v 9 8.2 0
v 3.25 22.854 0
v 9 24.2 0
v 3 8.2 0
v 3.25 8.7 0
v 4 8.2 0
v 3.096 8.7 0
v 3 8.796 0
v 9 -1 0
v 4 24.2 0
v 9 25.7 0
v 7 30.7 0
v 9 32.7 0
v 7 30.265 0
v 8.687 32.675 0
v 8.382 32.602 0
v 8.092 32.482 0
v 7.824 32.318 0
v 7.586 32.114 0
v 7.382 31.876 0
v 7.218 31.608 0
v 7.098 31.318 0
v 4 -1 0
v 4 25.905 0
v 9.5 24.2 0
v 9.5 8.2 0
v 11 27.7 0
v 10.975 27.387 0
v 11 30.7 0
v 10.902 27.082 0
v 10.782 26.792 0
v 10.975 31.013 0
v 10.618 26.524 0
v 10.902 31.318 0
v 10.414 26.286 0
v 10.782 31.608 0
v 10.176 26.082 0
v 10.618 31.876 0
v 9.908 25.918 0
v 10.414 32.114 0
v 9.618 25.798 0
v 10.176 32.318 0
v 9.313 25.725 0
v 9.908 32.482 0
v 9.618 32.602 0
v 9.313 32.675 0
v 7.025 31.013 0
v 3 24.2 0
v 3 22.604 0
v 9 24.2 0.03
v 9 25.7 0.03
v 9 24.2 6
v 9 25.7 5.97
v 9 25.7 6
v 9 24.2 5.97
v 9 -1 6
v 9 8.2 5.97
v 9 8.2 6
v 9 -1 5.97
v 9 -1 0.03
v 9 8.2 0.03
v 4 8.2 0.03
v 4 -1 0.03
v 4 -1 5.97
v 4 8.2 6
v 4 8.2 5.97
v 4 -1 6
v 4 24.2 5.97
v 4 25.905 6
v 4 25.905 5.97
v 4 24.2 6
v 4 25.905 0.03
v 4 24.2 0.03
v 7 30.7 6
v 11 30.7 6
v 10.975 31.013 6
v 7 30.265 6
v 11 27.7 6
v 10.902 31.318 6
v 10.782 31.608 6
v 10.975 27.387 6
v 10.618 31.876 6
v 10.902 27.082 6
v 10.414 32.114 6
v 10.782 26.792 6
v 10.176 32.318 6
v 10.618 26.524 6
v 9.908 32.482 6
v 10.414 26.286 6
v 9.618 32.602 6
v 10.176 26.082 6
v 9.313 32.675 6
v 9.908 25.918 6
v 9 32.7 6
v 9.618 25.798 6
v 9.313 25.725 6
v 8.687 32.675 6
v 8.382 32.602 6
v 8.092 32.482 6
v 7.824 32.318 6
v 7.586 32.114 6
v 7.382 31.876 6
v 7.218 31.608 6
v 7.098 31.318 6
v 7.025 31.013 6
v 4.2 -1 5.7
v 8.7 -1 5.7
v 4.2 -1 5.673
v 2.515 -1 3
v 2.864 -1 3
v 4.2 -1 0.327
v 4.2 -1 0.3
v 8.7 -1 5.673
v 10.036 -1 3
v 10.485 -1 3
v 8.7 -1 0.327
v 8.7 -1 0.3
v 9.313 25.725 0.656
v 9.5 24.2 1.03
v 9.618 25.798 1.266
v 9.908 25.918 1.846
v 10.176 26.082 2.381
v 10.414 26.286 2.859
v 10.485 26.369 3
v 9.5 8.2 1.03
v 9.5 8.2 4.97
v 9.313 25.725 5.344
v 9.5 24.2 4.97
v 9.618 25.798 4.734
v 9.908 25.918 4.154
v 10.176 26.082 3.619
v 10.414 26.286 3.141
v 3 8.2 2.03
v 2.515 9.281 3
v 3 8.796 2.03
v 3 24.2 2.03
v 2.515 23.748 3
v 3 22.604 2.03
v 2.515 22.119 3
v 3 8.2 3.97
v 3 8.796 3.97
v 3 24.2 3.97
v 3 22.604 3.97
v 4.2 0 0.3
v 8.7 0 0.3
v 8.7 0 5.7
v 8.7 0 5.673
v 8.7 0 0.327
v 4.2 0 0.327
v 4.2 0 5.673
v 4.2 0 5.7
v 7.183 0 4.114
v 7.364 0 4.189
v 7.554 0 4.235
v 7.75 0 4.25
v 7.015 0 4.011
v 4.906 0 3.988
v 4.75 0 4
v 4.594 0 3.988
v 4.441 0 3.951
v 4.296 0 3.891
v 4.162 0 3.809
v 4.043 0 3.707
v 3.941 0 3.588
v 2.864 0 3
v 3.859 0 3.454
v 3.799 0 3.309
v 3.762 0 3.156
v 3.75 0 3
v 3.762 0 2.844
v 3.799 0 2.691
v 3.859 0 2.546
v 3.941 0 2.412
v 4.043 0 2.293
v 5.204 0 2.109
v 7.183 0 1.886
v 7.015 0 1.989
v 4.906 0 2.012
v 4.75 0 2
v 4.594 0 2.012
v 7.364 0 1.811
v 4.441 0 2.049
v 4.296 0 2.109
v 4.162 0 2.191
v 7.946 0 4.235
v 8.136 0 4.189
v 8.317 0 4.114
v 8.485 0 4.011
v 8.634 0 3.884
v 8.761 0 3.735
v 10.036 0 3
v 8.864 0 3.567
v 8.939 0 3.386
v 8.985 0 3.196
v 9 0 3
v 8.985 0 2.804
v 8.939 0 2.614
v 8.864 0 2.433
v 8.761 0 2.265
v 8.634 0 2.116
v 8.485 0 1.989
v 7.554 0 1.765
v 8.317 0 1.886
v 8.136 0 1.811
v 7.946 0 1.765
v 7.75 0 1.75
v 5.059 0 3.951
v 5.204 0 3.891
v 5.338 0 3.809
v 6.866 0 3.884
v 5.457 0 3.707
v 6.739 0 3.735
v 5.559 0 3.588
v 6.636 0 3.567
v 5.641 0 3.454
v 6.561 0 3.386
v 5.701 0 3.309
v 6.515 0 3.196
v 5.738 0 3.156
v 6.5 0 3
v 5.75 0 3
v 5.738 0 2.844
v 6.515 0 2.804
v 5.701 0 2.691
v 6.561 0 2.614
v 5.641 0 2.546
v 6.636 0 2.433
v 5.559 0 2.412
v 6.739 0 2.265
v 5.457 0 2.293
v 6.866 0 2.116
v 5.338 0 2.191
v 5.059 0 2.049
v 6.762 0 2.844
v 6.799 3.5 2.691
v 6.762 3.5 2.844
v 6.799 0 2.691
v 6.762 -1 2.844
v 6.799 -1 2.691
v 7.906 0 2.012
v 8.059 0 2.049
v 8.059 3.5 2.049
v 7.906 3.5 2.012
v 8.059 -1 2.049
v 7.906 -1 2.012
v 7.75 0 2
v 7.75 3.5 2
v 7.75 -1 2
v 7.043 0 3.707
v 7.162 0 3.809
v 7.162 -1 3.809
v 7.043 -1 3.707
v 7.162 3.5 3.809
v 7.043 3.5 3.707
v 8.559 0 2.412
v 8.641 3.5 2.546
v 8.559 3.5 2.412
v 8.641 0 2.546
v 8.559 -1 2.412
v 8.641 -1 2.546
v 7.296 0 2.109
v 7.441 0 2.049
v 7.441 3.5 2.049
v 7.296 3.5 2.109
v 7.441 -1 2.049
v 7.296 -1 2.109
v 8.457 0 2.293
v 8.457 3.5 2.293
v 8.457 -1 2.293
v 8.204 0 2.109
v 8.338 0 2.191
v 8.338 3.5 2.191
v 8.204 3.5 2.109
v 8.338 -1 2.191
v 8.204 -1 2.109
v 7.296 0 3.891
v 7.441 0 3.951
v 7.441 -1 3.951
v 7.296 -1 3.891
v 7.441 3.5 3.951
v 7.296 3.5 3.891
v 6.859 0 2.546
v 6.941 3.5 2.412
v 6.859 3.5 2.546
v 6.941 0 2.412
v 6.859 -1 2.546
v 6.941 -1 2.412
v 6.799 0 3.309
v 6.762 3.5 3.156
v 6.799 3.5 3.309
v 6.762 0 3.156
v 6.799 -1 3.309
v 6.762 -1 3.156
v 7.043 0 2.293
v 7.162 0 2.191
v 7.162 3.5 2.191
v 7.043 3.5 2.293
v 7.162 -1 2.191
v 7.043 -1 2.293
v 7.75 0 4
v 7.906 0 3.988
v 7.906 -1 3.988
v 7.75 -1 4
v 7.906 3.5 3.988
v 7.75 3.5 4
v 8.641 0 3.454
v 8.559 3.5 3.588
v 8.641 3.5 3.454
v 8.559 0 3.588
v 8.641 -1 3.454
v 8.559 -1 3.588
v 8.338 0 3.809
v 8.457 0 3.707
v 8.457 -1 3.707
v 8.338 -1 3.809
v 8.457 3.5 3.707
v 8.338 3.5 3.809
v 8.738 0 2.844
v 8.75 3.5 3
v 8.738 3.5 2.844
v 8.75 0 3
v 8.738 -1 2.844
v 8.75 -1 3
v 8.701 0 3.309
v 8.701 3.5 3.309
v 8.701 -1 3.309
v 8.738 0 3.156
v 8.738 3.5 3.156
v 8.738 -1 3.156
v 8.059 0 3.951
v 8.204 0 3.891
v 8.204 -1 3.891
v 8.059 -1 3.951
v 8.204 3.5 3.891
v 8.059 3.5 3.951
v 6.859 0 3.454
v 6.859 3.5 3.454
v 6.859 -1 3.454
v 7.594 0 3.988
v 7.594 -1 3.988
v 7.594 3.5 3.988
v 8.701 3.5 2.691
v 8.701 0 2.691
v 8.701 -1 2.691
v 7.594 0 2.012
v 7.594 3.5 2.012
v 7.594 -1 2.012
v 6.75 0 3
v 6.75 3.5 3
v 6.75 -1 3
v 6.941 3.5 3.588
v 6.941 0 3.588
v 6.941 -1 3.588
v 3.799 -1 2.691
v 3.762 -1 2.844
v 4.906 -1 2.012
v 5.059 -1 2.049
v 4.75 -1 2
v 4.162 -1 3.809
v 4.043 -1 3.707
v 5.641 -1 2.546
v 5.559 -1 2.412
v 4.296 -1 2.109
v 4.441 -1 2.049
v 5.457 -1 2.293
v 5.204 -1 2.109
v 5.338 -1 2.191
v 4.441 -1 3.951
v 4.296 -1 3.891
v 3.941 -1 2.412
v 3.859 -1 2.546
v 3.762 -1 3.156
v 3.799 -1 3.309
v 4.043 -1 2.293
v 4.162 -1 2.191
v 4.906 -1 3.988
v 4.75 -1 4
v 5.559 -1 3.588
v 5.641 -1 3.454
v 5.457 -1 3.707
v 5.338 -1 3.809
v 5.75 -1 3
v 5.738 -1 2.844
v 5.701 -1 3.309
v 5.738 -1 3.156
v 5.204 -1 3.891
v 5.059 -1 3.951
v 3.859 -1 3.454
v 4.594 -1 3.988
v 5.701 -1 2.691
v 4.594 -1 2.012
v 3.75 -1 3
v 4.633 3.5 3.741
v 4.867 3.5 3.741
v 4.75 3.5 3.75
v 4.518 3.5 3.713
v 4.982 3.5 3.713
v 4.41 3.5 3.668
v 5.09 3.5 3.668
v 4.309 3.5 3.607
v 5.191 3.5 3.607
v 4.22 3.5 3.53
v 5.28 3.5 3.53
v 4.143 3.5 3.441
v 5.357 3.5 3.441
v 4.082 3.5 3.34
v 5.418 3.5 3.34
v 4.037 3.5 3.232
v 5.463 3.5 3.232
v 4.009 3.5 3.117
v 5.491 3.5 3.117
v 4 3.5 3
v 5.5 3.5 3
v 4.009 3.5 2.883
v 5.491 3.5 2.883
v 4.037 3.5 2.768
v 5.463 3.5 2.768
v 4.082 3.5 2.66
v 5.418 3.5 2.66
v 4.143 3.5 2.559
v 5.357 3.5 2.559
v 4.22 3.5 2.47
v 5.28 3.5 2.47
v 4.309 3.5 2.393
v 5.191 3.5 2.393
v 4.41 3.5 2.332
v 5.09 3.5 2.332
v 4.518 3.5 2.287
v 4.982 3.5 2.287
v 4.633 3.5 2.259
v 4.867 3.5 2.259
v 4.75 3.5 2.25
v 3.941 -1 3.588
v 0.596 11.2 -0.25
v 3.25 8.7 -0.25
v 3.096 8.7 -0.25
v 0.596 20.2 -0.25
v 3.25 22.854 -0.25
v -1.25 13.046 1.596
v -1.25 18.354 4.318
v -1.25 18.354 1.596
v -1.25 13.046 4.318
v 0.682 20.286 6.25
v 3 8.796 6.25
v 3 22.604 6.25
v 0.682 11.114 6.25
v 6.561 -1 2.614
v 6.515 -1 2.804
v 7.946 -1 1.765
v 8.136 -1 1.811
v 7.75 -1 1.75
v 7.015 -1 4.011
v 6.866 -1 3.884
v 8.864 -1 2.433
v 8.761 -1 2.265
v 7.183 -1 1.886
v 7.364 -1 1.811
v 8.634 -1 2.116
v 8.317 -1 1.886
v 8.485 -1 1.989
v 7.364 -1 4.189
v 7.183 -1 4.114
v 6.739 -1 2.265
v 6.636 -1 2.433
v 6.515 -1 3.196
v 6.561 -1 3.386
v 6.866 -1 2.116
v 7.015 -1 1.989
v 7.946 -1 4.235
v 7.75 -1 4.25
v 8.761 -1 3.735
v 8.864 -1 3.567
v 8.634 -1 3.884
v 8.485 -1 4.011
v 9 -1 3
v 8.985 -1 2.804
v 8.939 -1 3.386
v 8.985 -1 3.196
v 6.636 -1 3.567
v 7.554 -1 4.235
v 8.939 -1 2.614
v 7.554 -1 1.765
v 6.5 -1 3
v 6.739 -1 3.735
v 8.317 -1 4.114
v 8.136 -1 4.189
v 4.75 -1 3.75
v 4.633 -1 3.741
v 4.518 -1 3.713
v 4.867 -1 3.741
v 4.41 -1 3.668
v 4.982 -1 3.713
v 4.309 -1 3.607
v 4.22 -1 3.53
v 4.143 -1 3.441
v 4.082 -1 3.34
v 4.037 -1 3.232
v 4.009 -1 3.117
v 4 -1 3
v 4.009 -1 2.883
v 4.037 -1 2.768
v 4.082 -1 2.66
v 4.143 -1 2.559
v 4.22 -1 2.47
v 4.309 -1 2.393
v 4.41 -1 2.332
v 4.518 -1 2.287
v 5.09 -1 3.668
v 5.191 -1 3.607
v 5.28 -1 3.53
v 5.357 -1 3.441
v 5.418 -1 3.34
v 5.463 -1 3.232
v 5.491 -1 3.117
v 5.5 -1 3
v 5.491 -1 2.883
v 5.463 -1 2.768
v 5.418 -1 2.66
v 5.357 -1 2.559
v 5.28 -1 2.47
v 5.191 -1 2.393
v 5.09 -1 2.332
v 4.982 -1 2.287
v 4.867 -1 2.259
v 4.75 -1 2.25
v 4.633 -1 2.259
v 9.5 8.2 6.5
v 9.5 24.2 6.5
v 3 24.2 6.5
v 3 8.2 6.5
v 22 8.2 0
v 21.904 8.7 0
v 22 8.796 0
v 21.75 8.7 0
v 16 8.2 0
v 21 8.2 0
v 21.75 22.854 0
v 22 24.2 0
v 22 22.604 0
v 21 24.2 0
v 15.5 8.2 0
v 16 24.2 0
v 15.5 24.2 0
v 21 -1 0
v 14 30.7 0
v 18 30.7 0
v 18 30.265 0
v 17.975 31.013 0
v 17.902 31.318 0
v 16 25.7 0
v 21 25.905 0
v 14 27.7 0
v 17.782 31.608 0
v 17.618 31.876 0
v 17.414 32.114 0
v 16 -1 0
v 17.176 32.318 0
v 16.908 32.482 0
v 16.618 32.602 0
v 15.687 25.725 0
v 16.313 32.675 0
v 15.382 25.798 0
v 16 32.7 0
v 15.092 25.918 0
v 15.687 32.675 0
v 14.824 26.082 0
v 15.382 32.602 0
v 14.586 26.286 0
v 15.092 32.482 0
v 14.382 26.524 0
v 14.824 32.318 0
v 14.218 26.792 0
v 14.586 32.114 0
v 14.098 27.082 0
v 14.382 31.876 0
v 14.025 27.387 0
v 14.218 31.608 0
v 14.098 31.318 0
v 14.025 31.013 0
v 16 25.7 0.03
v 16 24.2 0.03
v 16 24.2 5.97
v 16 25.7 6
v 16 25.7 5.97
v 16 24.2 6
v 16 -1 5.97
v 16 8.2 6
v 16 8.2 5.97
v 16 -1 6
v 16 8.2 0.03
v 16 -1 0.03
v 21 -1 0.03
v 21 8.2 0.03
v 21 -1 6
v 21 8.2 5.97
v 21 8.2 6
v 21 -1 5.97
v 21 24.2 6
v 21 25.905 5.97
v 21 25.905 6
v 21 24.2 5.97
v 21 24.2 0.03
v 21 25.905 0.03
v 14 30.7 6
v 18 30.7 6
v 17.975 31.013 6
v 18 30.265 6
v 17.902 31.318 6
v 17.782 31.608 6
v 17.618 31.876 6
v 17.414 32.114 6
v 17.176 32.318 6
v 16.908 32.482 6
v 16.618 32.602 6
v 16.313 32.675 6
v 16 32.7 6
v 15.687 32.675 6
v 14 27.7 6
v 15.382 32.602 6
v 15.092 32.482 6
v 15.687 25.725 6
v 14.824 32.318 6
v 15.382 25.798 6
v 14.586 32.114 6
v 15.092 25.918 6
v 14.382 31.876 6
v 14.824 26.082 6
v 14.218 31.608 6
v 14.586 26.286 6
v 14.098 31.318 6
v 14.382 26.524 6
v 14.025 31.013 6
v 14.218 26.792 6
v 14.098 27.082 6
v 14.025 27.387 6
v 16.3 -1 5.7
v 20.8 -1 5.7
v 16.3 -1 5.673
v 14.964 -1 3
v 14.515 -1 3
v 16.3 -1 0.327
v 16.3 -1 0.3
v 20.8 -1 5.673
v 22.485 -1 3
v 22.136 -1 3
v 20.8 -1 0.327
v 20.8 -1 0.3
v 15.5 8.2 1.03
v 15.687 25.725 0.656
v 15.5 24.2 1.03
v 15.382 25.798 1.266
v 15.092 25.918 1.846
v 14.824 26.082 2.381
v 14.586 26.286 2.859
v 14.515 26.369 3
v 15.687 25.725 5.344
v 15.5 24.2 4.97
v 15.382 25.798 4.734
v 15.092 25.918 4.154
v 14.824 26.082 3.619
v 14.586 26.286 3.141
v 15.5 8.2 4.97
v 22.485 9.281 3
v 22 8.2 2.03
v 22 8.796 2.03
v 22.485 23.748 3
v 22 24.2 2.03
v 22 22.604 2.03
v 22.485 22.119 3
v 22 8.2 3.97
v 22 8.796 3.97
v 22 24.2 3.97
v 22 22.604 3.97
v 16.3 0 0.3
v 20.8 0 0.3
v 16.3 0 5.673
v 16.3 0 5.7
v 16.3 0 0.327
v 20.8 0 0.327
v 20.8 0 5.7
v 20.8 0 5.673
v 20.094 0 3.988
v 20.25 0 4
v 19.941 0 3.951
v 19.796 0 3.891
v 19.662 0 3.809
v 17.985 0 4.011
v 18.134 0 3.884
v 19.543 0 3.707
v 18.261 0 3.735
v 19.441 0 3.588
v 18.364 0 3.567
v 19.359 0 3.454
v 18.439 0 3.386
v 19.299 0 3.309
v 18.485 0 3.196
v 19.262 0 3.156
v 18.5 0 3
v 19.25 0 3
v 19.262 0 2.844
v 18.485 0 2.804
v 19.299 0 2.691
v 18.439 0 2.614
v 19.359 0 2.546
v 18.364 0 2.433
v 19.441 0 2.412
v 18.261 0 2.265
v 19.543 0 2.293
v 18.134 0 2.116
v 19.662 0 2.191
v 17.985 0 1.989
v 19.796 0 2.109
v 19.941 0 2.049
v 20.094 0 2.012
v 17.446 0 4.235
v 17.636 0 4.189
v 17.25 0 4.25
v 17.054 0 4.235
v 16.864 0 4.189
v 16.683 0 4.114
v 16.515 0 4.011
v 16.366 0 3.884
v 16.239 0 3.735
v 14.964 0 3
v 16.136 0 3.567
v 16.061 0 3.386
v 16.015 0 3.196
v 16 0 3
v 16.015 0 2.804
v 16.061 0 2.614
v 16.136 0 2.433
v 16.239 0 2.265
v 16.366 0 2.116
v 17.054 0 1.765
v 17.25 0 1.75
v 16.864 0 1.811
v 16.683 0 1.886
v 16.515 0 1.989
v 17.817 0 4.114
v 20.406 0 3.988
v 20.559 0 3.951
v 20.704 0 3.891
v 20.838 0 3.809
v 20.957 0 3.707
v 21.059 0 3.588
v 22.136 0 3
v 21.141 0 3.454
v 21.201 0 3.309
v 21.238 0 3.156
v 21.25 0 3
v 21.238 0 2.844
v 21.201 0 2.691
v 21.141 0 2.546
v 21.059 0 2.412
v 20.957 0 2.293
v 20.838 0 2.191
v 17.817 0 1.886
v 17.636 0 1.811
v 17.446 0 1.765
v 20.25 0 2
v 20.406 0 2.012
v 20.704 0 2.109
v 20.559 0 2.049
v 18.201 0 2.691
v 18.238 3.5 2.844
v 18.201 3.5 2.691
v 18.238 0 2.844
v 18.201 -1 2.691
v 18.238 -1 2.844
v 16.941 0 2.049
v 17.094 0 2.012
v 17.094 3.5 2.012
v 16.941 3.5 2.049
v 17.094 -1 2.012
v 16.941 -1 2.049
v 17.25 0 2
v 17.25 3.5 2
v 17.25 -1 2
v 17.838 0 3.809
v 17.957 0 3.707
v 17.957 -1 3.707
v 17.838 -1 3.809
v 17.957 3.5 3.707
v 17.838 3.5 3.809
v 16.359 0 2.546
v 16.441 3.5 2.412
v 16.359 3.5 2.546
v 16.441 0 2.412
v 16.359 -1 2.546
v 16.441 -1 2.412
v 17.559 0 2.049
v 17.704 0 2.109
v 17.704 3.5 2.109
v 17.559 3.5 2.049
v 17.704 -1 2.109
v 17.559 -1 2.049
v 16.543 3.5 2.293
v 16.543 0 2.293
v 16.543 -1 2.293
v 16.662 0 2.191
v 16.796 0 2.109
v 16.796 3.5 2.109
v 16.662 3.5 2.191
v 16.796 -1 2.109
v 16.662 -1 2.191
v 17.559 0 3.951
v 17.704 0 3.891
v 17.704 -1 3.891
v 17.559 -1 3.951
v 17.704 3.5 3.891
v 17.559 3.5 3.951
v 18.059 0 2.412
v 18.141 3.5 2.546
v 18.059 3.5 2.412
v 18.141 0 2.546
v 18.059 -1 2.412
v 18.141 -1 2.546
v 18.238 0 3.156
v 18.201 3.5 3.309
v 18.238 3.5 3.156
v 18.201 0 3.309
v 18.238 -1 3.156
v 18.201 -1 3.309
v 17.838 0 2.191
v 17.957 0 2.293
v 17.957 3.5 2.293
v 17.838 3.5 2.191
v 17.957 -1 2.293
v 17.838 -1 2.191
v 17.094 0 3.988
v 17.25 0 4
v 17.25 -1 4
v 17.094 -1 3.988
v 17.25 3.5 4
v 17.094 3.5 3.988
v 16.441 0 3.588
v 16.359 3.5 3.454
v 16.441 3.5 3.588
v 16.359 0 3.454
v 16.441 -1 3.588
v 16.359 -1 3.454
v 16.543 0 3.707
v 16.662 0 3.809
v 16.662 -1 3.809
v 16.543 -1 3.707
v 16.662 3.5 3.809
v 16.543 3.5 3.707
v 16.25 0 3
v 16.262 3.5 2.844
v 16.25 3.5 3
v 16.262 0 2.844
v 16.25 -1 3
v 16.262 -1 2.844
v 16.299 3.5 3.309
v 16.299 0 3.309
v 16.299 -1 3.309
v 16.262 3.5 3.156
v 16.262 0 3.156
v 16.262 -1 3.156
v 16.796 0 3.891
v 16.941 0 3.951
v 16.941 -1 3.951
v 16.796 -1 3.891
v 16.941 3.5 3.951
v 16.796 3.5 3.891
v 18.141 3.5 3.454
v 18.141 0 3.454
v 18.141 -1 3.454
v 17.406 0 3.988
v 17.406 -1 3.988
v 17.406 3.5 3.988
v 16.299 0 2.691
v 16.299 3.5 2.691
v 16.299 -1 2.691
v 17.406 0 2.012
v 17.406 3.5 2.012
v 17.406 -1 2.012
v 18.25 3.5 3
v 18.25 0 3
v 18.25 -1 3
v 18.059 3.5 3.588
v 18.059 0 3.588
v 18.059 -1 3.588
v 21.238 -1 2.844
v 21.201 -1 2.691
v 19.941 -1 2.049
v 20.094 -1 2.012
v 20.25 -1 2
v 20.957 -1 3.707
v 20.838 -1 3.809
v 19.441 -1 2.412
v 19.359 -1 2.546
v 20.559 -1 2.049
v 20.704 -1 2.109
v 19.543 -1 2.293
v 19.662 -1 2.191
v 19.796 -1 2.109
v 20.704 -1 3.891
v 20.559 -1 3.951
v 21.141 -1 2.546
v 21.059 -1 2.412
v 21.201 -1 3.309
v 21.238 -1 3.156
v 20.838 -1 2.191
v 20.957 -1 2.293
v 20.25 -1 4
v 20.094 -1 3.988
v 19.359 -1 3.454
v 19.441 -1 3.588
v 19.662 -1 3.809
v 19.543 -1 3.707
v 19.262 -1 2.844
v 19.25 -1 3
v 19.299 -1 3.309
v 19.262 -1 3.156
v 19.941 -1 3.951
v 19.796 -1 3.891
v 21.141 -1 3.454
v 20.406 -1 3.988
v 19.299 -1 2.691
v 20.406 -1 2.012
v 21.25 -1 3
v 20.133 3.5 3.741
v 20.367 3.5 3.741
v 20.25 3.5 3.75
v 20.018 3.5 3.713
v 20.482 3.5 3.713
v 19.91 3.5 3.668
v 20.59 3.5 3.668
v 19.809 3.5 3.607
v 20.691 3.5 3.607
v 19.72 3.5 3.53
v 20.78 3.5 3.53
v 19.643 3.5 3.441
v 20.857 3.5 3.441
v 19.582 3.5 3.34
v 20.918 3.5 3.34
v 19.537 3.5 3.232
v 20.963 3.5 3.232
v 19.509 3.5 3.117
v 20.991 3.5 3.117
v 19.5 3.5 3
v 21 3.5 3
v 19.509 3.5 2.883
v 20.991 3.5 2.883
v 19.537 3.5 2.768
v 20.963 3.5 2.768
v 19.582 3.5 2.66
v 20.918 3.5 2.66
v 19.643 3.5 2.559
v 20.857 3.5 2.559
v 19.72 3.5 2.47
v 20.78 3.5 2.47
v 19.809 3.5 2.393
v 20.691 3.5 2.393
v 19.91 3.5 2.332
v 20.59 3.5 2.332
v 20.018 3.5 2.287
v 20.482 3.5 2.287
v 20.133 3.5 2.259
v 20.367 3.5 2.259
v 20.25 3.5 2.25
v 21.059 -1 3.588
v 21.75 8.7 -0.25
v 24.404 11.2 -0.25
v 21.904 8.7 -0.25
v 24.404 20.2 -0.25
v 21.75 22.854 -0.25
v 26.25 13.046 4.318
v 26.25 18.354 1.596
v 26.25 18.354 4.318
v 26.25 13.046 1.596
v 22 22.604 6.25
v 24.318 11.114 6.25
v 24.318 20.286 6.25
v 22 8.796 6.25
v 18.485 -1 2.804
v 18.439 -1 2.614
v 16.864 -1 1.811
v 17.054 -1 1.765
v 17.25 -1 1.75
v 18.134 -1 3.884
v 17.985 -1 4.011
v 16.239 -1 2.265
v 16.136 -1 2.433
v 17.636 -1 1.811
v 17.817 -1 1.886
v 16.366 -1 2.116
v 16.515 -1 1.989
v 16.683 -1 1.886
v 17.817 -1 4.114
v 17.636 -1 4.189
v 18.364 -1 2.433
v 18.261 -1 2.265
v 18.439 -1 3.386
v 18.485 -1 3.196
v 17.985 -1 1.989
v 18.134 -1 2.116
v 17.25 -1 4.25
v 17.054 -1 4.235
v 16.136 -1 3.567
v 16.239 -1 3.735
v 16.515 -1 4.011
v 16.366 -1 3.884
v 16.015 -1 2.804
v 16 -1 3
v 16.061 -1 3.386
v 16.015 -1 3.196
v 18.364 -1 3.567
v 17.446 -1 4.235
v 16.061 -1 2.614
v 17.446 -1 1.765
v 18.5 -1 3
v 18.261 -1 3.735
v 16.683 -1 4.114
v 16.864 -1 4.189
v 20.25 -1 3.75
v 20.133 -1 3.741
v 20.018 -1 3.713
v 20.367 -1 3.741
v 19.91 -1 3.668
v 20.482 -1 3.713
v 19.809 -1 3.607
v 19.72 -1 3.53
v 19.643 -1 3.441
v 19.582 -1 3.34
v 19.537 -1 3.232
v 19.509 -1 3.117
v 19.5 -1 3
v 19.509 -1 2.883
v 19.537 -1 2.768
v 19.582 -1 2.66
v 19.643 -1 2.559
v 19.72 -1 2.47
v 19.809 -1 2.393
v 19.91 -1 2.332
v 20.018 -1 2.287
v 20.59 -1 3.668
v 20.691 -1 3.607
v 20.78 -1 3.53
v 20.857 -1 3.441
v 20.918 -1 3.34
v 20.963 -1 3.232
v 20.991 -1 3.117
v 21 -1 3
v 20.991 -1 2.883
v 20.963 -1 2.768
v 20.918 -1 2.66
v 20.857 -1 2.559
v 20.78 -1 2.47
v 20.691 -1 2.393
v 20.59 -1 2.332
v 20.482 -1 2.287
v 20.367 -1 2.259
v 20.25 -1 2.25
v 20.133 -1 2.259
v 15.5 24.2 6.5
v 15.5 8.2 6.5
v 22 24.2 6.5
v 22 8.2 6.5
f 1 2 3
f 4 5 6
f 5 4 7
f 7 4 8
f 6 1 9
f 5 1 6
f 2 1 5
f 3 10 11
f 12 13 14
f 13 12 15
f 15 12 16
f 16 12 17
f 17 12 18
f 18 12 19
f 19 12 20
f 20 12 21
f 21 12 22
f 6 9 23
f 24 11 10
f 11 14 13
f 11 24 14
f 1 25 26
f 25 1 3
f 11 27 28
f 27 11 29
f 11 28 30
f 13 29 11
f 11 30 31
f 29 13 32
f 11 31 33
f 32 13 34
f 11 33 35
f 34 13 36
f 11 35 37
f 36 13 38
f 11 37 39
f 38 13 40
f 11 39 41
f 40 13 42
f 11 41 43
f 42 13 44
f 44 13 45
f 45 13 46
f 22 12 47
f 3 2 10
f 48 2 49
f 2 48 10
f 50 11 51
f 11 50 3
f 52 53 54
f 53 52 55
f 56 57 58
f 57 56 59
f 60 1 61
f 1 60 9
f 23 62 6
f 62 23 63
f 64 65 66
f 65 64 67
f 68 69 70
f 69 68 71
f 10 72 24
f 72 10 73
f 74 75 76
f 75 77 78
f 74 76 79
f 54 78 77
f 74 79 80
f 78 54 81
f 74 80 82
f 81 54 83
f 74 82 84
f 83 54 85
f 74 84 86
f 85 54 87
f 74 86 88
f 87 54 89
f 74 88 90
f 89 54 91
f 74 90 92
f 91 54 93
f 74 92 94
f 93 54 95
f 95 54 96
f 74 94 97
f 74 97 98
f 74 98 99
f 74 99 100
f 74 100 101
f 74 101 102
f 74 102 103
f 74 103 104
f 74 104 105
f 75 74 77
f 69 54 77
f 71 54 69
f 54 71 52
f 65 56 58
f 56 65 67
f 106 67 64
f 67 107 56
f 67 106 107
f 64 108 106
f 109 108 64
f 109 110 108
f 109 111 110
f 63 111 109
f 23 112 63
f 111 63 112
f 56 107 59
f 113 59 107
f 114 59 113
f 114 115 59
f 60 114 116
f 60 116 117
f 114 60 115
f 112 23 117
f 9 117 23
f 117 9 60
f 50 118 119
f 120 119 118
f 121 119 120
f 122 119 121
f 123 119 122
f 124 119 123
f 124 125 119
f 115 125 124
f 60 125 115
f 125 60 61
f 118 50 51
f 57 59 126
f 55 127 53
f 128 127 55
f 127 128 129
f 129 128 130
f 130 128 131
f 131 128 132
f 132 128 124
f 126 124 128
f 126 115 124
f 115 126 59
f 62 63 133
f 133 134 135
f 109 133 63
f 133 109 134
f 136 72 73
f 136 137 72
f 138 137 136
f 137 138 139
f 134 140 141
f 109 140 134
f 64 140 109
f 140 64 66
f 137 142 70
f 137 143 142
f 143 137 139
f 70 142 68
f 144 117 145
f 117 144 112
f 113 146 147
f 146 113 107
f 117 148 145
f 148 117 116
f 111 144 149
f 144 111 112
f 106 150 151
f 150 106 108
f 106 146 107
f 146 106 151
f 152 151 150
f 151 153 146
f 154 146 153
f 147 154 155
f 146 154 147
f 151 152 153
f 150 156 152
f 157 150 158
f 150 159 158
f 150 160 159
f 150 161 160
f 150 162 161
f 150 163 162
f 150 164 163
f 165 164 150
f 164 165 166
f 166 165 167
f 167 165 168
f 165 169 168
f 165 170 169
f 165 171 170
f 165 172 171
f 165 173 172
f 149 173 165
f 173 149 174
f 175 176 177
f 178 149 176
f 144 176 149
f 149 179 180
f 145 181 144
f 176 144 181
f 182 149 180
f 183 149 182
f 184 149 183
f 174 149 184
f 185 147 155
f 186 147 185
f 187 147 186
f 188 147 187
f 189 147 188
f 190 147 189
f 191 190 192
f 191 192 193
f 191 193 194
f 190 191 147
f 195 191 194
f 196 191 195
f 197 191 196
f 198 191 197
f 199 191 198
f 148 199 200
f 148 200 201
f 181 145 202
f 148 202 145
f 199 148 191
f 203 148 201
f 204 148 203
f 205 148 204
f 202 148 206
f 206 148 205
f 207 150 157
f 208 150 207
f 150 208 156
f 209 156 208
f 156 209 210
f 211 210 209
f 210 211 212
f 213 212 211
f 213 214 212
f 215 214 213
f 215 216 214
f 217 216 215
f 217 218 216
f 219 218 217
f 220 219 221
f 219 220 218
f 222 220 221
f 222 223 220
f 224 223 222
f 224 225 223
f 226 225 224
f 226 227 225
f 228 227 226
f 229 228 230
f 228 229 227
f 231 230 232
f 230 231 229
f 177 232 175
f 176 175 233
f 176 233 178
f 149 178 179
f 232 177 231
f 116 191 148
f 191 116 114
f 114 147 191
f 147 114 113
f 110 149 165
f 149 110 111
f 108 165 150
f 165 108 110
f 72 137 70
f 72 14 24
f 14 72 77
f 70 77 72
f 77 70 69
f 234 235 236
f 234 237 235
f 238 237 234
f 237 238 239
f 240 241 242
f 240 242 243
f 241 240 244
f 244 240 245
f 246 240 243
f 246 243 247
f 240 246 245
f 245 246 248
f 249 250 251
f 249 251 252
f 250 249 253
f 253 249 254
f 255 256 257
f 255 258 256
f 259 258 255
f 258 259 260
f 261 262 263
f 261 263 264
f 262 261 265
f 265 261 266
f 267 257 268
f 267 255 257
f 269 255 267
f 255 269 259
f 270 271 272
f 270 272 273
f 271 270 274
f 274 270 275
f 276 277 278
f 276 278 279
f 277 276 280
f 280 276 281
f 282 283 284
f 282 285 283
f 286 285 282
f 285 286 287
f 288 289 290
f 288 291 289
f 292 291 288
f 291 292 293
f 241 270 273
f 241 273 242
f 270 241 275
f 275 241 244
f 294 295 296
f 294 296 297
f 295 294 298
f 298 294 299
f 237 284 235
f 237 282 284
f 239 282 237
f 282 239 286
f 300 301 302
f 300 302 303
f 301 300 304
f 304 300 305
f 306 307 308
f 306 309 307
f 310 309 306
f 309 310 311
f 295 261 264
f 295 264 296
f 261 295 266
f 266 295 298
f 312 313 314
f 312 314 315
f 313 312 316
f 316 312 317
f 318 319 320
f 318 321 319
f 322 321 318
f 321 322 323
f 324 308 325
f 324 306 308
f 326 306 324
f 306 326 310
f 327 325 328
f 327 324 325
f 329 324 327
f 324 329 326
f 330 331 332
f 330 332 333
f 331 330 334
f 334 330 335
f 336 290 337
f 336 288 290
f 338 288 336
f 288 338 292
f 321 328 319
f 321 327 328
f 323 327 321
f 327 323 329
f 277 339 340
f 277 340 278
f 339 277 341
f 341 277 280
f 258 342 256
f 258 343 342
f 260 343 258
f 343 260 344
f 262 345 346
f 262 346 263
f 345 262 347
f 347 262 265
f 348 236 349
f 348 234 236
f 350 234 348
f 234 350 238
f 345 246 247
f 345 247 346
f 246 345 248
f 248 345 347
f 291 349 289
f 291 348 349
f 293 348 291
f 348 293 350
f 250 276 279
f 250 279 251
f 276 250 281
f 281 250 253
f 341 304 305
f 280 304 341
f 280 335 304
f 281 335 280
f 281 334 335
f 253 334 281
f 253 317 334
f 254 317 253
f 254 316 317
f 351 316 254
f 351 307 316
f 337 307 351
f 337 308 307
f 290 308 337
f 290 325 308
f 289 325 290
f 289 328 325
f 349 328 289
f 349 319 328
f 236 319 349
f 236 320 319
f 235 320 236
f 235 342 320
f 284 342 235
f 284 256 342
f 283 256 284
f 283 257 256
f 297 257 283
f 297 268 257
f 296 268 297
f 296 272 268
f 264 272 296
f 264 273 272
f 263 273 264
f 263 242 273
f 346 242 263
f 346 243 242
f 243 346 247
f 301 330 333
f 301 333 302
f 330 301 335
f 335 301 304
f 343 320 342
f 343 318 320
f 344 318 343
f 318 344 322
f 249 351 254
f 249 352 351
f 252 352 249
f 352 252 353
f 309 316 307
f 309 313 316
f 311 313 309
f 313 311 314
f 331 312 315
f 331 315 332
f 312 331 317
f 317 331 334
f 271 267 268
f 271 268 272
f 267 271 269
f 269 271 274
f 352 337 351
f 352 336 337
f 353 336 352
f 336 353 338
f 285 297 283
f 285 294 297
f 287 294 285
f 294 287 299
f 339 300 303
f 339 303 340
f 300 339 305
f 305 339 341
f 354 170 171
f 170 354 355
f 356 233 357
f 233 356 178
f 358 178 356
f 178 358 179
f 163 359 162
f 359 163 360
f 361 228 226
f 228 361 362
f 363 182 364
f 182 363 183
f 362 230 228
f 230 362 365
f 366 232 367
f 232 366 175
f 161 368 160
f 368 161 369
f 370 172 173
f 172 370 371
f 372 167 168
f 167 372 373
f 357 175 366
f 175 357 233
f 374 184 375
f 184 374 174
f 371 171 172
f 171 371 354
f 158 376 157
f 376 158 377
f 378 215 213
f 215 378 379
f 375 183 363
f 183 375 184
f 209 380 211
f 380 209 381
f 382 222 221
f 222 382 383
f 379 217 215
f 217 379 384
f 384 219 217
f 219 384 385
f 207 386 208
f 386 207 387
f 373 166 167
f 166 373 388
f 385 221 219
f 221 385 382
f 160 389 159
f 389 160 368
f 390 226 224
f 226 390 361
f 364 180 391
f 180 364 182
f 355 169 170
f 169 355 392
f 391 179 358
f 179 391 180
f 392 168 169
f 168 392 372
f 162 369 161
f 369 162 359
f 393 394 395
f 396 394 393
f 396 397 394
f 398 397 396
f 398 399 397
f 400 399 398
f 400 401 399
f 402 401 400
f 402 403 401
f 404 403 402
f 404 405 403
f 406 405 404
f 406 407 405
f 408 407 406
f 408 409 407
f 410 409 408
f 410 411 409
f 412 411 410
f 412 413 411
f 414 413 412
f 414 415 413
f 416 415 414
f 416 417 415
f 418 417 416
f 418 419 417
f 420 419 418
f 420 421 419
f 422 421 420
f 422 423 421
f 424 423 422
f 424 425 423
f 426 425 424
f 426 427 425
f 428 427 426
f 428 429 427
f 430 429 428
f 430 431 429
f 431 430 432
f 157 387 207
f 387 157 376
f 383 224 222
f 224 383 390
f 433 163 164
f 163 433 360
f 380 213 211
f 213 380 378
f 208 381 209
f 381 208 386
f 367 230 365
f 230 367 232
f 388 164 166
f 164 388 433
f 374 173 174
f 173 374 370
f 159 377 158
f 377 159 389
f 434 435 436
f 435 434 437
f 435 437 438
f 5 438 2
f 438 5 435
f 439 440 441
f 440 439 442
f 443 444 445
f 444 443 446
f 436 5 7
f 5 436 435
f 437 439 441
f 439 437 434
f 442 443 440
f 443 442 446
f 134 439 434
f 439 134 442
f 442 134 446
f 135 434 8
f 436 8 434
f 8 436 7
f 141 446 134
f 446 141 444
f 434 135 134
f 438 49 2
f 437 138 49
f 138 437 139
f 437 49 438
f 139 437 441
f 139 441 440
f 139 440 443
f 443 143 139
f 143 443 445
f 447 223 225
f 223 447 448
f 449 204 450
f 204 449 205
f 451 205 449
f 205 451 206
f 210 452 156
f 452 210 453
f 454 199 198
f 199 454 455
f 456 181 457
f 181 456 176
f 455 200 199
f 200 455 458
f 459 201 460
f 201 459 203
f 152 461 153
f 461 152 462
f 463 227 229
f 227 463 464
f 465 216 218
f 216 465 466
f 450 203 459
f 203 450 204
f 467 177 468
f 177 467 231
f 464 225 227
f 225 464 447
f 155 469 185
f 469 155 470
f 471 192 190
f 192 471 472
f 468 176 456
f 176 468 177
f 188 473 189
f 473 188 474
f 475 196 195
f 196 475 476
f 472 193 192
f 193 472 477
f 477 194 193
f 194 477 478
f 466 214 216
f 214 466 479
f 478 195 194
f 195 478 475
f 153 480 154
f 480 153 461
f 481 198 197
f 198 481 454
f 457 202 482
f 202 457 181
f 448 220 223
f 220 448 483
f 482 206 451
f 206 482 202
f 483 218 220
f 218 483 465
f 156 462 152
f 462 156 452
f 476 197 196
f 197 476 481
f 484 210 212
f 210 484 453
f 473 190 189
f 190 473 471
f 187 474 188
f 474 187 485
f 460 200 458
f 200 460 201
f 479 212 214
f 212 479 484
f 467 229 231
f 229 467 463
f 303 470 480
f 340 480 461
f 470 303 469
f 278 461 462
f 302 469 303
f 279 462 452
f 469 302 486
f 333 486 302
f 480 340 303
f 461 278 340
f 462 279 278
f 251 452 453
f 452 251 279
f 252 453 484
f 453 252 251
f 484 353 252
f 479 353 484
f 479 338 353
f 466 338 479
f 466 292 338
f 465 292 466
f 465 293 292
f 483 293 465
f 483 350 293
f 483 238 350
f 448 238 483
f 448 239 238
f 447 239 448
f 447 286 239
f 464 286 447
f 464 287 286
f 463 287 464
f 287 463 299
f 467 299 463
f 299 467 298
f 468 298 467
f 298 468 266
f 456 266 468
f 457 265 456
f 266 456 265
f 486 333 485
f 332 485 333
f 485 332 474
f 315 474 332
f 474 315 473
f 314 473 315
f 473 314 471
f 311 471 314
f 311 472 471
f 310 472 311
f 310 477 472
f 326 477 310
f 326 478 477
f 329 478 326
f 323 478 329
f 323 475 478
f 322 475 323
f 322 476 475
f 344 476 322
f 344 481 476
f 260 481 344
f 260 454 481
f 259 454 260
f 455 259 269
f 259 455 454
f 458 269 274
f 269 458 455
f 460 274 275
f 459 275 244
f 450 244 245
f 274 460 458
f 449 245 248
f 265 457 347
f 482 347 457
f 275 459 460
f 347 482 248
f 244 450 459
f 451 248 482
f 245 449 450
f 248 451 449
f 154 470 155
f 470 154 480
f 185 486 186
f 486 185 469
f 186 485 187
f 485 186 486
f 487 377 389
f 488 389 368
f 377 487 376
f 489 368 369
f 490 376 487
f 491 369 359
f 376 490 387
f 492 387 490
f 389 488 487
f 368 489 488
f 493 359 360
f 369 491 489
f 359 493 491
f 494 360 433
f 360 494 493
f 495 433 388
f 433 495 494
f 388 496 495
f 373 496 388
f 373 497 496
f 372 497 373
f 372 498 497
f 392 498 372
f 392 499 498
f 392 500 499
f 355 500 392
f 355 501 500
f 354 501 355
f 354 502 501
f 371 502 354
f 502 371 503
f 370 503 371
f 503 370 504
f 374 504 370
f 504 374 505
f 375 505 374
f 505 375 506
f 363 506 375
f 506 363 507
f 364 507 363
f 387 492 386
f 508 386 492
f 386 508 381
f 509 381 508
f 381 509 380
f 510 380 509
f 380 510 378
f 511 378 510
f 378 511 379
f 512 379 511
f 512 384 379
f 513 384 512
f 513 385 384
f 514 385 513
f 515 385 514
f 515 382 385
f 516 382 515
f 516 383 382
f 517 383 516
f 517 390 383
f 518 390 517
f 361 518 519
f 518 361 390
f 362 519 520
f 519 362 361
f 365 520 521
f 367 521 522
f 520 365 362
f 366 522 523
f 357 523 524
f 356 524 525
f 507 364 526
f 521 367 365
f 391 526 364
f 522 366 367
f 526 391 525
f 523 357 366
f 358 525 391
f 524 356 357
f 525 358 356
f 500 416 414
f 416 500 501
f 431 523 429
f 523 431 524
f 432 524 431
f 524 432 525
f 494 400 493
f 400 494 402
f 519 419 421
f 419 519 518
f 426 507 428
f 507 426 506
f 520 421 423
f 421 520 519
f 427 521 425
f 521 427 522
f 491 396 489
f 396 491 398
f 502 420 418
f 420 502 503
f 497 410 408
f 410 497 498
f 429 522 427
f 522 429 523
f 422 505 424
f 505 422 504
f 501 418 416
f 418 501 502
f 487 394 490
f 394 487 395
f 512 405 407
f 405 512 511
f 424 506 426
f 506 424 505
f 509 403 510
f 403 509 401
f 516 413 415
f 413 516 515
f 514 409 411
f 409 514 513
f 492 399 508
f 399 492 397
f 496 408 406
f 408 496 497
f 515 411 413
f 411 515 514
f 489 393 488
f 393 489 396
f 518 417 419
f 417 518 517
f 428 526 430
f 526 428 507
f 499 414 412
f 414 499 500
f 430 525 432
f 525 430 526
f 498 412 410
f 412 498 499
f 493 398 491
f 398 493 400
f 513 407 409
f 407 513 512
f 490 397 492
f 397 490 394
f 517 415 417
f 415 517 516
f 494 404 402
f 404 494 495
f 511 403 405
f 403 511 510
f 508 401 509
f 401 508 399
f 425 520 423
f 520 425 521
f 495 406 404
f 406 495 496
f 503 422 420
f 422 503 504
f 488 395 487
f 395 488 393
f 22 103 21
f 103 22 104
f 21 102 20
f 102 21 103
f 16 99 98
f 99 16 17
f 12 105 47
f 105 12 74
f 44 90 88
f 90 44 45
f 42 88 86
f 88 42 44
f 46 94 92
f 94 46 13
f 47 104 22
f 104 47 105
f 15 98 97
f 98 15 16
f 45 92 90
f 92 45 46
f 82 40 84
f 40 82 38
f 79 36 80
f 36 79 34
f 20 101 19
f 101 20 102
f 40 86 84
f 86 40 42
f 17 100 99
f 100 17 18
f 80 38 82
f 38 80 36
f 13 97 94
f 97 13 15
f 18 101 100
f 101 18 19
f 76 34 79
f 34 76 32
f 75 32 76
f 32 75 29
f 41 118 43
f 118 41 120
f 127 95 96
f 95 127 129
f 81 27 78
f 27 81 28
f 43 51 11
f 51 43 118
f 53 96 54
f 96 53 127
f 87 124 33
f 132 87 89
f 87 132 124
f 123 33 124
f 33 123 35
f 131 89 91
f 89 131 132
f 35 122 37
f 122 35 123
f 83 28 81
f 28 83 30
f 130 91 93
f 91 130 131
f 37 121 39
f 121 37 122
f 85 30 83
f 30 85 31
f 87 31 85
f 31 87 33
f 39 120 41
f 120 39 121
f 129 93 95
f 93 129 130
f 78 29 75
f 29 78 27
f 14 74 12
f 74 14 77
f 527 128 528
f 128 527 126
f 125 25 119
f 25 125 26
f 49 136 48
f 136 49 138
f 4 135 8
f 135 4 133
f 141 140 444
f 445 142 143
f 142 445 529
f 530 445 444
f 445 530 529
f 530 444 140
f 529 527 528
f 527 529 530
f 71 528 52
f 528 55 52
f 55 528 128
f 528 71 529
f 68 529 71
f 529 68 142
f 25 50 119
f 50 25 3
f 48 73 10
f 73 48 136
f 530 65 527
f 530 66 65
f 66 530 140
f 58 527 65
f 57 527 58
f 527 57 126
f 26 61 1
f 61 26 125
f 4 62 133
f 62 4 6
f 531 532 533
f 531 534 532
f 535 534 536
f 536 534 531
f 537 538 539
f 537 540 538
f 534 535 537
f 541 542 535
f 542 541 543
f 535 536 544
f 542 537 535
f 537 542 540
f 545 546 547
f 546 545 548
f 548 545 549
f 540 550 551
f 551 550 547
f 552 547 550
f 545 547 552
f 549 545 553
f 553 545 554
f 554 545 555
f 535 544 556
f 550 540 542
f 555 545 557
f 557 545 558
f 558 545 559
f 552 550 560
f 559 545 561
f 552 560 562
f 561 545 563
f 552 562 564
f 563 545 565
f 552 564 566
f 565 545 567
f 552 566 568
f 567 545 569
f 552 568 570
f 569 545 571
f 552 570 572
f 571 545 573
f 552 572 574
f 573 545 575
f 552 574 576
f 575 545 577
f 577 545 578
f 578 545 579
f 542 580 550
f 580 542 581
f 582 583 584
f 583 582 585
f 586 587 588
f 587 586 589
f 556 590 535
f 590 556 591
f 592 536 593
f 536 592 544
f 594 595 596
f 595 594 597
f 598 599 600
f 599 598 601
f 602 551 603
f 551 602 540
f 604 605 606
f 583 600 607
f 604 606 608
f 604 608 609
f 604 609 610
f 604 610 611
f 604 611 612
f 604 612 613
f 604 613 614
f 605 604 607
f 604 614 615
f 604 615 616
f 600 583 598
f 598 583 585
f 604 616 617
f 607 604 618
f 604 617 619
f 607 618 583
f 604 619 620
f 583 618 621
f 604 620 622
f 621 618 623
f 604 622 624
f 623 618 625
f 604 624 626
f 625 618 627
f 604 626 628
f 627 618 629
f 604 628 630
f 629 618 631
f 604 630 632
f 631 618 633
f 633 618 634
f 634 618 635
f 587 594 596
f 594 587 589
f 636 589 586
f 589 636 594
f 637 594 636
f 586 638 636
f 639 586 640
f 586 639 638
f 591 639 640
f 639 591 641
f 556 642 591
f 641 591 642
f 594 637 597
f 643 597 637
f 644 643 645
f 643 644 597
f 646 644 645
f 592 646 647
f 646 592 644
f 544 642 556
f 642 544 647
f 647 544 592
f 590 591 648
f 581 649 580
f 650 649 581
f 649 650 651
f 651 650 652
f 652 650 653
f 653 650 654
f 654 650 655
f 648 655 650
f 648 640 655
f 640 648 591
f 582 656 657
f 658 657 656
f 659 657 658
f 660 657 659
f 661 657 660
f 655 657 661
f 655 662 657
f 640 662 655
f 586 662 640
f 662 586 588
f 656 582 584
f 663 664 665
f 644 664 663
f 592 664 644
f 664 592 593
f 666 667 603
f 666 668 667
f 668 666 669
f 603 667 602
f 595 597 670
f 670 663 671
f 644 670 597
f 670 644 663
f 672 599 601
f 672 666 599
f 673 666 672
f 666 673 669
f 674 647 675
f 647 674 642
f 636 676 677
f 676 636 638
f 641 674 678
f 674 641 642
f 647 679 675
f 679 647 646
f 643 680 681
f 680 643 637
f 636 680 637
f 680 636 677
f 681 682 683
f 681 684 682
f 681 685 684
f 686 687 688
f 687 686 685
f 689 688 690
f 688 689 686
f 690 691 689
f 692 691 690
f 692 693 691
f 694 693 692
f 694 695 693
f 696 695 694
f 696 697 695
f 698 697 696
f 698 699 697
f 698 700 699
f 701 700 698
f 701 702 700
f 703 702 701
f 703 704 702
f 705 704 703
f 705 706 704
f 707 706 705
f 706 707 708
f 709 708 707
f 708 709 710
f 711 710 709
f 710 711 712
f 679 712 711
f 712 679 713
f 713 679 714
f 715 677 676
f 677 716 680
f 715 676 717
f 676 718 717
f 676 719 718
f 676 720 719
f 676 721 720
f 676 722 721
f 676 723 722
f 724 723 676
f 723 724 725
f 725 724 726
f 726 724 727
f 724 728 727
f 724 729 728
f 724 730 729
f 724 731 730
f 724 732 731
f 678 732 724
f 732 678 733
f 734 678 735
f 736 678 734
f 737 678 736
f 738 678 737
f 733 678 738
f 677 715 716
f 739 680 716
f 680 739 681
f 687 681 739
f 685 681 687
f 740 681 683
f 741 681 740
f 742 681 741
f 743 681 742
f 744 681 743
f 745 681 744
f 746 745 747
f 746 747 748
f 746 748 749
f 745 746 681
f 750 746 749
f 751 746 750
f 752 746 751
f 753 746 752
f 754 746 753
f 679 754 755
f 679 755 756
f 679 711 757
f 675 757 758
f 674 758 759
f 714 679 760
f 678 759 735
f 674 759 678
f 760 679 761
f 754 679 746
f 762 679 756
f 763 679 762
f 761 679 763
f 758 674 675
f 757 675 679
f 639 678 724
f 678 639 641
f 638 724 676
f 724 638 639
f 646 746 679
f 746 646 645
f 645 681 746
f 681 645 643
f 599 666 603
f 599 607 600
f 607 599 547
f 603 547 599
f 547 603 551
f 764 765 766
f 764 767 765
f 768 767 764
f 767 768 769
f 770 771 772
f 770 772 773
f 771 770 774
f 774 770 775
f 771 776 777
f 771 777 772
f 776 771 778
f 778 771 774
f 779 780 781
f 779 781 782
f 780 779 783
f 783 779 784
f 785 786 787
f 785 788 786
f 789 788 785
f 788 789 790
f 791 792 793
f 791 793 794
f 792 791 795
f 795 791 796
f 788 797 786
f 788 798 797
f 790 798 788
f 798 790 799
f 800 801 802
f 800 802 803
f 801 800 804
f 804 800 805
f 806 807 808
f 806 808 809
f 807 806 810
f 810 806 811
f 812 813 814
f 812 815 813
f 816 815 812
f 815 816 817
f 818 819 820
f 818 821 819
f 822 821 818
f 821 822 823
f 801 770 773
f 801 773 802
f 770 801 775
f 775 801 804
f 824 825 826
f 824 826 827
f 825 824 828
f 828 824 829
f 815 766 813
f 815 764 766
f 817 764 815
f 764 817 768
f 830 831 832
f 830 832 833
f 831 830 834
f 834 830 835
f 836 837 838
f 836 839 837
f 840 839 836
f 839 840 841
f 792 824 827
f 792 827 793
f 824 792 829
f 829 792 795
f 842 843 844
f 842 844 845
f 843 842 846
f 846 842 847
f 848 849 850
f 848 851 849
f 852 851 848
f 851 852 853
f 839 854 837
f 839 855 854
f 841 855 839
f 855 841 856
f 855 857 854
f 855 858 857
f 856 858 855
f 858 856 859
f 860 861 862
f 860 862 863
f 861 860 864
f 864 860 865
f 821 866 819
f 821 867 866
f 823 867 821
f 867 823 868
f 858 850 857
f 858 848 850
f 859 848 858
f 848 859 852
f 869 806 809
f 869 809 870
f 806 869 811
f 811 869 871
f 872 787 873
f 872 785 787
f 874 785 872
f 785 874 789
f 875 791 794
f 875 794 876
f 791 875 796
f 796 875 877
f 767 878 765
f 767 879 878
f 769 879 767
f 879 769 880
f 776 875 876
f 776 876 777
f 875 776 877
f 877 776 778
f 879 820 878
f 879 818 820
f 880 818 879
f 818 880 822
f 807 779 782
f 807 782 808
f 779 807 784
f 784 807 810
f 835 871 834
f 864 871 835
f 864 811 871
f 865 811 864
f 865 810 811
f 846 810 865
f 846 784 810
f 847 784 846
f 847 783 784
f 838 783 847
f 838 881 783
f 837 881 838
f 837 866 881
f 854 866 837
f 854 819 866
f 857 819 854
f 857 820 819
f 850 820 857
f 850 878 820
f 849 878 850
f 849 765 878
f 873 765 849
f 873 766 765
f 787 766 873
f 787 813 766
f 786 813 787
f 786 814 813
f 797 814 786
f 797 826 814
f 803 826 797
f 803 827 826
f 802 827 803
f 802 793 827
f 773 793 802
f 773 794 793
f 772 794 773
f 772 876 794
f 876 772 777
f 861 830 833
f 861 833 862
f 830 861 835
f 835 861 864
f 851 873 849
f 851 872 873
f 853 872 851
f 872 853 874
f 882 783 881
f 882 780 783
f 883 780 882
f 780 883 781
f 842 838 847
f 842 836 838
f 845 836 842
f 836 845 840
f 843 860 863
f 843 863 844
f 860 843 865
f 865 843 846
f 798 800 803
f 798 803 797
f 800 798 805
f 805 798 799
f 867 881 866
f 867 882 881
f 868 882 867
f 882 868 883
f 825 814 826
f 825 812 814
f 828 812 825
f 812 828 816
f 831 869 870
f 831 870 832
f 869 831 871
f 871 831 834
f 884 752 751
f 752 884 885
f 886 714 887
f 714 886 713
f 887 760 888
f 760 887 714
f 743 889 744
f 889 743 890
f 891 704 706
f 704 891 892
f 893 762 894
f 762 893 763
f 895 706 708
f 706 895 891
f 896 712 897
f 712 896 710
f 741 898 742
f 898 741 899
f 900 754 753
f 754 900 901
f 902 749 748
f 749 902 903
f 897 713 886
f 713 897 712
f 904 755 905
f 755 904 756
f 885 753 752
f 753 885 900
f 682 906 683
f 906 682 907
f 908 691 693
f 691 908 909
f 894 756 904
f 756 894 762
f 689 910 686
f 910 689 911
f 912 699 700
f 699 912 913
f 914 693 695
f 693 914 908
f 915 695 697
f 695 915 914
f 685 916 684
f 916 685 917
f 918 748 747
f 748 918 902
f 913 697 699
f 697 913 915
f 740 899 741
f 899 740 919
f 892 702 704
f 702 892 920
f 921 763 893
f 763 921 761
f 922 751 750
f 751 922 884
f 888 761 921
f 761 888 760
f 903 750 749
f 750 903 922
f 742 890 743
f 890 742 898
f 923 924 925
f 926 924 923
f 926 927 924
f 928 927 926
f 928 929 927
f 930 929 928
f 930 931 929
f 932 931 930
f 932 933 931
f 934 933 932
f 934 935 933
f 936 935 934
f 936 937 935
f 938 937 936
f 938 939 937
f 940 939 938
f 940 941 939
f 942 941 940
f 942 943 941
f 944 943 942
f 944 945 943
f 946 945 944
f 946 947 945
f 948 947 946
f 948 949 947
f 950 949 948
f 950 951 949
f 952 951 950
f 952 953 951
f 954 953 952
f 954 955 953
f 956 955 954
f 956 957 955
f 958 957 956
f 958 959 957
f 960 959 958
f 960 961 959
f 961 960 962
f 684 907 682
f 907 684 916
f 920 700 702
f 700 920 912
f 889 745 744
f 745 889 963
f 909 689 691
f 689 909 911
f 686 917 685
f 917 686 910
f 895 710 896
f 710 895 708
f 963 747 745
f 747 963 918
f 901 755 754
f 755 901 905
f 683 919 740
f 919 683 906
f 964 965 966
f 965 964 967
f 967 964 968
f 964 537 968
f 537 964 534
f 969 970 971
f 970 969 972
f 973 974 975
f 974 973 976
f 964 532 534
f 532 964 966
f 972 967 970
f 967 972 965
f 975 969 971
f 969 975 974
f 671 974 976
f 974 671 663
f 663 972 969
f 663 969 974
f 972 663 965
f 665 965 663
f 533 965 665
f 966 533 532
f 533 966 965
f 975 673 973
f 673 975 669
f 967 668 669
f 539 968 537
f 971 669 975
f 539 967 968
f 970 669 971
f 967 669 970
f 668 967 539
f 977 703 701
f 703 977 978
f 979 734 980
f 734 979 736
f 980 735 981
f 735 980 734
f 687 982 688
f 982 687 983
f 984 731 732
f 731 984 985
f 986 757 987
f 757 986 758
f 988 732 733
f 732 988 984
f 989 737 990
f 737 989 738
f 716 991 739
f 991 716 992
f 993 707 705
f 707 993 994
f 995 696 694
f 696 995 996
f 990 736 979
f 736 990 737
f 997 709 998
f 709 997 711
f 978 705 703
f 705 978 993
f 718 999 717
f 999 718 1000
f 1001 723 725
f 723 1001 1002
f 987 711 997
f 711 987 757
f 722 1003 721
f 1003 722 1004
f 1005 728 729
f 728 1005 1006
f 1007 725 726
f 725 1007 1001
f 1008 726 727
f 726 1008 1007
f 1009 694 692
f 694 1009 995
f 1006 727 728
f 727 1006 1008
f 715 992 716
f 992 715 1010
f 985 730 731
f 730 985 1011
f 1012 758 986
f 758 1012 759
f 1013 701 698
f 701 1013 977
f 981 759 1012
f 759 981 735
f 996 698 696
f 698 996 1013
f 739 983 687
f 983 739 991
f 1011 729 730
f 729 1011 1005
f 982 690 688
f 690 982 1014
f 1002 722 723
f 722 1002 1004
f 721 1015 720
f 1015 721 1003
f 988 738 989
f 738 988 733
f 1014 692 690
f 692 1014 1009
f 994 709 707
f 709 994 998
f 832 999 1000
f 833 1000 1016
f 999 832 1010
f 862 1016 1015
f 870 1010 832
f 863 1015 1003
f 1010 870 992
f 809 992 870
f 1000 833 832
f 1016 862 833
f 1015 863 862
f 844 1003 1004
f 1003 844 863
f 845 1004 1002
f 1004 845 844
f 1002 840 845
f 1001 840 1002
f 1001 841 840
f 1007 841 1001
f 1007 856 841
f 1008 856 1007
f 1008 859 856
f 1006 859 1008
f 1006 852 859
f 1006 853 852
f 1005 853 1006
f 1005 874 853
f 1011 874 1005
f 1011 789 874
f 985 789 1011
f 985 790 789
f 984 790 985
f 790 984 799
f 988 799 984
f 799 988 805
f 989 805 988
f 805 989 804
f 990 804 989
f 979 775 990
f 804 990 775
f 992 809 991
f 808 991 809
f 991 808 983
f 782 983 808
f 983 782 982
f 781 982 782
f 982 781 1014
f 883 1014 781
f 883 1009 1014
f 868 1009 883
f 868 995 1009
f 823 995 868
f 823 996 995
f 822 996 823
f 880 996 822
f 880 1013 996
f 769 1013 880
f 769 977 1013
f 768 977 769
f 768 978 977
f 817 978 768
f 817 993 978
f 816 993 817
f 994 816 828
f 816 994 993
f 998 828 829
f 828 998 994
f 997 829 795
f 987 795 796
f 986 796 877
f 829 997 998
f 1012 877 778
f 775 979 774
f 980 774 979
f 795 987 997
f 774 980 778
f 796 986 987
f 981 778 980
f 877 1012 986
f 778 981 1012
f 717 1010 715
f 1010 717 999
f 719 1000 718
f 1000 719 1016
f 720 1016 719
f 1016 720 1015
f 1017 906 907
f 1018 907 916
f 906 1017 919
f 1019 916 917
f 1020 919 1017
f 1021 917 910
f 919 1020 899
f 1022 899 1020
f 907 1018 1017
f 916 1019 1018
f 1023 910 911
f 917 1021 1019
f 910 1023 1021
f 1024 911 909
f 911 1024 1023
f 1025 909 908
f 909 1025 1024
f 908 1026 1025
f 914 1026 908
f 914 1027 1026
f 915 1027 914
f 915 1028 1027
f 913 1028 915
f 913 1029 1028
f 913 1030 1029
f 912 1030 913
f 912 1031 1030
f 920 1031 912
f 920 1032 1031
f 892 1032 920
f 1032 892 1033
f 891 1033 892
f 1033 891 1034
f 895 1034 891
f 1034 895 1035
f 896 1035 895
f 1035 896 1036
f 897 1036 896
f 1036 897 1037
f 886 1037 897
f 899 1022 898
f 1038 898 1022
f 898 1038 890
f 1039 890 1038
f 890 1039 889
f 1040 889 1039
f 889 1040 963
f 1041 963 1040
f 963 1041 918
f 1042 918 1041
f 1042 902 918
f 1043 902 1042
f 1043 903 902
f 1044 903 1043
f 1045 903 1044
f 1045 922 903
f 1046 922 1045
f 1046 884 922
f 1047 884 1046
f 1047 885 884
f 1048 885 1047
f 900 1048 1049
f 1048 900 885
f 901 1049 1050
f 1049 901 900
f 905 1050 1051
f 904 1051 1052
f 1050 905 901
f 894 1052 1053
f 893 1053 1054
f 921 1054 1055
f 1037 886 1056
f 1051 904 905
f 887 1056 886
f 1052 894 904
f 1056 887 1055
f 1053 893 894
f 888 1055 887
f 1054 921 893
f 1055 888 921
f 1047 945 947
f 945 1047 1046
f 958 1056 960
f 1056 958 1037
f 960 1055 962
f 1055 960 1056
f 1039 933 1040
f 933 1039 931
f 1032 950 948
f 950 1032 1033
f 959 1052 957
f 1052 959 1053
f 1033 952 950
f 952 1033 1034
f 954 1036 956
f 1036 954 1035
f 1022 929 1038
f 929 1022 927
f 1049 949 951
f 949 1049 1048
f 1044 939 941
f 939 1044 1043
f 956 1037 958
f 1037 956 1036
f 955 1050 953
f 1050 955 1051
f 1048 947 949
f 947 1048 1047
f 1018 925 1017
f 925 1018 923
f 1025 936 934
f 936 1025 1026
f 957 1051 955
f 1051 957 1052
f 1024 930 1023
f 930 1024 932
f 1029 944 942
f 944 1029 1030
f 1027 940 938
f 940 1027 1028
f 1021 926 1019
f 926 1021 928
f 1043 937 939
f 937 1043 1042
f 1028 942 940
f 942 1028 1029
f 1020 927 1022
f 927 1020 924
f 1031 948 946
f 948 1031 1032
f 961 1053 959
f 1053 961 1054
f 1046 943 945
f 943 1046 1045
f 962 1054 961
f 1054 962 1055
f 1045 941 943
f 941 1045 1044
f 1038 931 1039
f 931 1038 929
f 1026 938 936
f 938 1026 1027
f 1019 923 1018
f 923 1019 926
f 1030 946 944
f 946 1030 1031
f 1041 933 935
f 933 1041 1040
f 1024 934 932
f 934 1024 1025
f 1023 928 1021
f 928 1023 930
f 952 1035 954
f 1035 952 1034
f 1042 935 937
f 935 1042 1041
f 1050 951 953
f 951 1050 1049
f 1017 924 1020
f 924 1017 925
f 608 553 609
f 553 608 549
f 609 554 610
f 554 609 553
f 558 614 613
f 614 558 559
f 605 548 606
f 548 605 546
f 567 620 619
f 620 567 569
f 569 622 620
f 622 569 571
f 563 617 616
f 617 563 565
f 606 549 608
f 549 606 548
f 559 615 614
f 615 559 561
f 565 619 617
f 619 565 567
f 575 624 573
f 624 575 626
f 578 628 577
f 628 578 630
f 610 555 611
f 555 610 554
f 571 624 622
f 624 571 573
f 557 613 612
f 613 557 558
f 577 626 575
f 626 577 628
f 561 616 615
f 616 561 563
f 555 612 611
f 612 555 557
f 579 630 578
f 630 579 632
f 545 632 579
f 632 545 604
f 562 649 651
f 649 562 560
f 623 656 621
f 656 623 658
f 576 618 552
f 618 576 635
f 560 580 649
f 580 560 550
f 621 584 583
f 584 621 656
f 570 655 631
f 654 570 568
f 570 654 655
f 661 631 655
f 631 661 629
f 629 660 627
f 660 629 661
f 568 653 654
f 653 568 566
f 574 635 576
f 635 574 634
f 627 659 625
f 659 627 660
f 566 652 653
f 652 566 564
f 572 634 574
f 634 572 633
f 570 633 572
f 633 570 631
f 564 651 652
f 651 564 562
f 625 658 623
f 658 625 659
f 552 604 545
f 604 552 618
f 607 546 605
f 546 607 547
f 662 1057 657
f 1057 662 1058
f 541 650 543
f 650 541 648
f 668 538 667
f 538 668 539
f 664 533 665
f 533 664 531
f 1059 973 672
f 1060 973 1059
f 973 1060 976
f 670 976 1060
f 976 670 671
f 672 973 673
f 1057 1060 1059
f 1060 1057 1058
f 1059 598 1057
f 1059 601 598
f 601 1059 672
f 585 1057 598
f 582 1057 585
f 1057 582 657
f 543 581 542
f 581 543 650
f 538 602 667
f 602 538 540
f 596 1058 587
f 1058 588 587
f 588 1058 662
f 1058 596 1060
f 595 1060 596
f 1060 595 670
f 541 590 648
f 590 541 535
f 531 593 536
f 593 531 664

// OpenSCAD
//translate([-11,0,-35]) import_stl(filename="madcat_arm.stl");

module barrel(){
	union(){
		translate([0,8.5,6.5])cube([6,33,5],center=true);
		translate([0,8.5,9]) scale([1,1,0.5]) rotate([0,45,0]) cube([4.2,33,4.2],center=true);
		translate([0,8.5,4]) scale([1,1,0.5]) rotate([0,45,0]) cube([4.2,33,4.2],center=true);
	}
}

module ppg(){
union(){
	difference(){
		barrel();
		translate([0,-9.5,0.6]) scale([0.9,0.1,0.9]) barrel();

		translate([0,20,0.5]) scale([1,1,0.5]) rotate([54,0,0]) cube([10,50,10],center=true);

		translate([0,-6,7.75]) rotate([90,0,0]) cylinder(r=1,h=5,center=true,$fn=40);
		translate([0,-6,4.75]) rotate([90,0,0]) cylinder(r=1,h=5,center=true,$fn=40);
	}

	translate([0,23.7,9]) rotate([0,90,0]) cylinder(r=2,h=6,center=true,$fn=40);
	translate([0,20.7,9]) rotate([0,90,0]) cylinder(r=2,h=6,center=true,$fn=40);
	translate([0,22.2,9]) cube([6,3,4], center=true);

	translate([-0.25,9.2,6.25]) cube([6.5,16,6.5], center=true);
	difference(){
		translate([0,9.2,1]) cube([6.5,15,4.5], center=true);
		translate([5.25,9.2,-2]) rotate([0,45,0])  cube([6.5,12,4.5], center=true);
		translate([-3.75,9.2,-2]) rotate([0,45,0])  cube([6.5,12,4.5], center=true);
		translate([0,2.2,-2]) rotate([-45,0,0]) cube([7.5,12,6.5], center=true);
		translate([0,15.2,-2]) rotate([45,0,0]) cube([7.5,12,6.5], center=true);
	}

	difference(){
		translate([0,-5.5,7.75]) rotate([90,0,0]) cylinder(r=1.25,h=5,center=true,$fn=40);
		translate([0,-6,7.75]) rotate([90,0,0]) cylinder(r=1,h=7,center=true,$fn=40);
	}
	difference(){
		translate([0,-5.5,4.75]) rotate([90,0,0]) cylinder(r=1,h=5,center=true,$fn=40);
		translate([0,-5.5,4.75]) rotate([90,0,0]) cylinder(r=0.75,h=7,center=true,$fn=40);
	}
	}
}

translate([0,7,3]) rotate([0,90,0]) ppg();

translate([25,7,3]) rotate([0,-90,0]) mirror([1,0,0]) ppg();
